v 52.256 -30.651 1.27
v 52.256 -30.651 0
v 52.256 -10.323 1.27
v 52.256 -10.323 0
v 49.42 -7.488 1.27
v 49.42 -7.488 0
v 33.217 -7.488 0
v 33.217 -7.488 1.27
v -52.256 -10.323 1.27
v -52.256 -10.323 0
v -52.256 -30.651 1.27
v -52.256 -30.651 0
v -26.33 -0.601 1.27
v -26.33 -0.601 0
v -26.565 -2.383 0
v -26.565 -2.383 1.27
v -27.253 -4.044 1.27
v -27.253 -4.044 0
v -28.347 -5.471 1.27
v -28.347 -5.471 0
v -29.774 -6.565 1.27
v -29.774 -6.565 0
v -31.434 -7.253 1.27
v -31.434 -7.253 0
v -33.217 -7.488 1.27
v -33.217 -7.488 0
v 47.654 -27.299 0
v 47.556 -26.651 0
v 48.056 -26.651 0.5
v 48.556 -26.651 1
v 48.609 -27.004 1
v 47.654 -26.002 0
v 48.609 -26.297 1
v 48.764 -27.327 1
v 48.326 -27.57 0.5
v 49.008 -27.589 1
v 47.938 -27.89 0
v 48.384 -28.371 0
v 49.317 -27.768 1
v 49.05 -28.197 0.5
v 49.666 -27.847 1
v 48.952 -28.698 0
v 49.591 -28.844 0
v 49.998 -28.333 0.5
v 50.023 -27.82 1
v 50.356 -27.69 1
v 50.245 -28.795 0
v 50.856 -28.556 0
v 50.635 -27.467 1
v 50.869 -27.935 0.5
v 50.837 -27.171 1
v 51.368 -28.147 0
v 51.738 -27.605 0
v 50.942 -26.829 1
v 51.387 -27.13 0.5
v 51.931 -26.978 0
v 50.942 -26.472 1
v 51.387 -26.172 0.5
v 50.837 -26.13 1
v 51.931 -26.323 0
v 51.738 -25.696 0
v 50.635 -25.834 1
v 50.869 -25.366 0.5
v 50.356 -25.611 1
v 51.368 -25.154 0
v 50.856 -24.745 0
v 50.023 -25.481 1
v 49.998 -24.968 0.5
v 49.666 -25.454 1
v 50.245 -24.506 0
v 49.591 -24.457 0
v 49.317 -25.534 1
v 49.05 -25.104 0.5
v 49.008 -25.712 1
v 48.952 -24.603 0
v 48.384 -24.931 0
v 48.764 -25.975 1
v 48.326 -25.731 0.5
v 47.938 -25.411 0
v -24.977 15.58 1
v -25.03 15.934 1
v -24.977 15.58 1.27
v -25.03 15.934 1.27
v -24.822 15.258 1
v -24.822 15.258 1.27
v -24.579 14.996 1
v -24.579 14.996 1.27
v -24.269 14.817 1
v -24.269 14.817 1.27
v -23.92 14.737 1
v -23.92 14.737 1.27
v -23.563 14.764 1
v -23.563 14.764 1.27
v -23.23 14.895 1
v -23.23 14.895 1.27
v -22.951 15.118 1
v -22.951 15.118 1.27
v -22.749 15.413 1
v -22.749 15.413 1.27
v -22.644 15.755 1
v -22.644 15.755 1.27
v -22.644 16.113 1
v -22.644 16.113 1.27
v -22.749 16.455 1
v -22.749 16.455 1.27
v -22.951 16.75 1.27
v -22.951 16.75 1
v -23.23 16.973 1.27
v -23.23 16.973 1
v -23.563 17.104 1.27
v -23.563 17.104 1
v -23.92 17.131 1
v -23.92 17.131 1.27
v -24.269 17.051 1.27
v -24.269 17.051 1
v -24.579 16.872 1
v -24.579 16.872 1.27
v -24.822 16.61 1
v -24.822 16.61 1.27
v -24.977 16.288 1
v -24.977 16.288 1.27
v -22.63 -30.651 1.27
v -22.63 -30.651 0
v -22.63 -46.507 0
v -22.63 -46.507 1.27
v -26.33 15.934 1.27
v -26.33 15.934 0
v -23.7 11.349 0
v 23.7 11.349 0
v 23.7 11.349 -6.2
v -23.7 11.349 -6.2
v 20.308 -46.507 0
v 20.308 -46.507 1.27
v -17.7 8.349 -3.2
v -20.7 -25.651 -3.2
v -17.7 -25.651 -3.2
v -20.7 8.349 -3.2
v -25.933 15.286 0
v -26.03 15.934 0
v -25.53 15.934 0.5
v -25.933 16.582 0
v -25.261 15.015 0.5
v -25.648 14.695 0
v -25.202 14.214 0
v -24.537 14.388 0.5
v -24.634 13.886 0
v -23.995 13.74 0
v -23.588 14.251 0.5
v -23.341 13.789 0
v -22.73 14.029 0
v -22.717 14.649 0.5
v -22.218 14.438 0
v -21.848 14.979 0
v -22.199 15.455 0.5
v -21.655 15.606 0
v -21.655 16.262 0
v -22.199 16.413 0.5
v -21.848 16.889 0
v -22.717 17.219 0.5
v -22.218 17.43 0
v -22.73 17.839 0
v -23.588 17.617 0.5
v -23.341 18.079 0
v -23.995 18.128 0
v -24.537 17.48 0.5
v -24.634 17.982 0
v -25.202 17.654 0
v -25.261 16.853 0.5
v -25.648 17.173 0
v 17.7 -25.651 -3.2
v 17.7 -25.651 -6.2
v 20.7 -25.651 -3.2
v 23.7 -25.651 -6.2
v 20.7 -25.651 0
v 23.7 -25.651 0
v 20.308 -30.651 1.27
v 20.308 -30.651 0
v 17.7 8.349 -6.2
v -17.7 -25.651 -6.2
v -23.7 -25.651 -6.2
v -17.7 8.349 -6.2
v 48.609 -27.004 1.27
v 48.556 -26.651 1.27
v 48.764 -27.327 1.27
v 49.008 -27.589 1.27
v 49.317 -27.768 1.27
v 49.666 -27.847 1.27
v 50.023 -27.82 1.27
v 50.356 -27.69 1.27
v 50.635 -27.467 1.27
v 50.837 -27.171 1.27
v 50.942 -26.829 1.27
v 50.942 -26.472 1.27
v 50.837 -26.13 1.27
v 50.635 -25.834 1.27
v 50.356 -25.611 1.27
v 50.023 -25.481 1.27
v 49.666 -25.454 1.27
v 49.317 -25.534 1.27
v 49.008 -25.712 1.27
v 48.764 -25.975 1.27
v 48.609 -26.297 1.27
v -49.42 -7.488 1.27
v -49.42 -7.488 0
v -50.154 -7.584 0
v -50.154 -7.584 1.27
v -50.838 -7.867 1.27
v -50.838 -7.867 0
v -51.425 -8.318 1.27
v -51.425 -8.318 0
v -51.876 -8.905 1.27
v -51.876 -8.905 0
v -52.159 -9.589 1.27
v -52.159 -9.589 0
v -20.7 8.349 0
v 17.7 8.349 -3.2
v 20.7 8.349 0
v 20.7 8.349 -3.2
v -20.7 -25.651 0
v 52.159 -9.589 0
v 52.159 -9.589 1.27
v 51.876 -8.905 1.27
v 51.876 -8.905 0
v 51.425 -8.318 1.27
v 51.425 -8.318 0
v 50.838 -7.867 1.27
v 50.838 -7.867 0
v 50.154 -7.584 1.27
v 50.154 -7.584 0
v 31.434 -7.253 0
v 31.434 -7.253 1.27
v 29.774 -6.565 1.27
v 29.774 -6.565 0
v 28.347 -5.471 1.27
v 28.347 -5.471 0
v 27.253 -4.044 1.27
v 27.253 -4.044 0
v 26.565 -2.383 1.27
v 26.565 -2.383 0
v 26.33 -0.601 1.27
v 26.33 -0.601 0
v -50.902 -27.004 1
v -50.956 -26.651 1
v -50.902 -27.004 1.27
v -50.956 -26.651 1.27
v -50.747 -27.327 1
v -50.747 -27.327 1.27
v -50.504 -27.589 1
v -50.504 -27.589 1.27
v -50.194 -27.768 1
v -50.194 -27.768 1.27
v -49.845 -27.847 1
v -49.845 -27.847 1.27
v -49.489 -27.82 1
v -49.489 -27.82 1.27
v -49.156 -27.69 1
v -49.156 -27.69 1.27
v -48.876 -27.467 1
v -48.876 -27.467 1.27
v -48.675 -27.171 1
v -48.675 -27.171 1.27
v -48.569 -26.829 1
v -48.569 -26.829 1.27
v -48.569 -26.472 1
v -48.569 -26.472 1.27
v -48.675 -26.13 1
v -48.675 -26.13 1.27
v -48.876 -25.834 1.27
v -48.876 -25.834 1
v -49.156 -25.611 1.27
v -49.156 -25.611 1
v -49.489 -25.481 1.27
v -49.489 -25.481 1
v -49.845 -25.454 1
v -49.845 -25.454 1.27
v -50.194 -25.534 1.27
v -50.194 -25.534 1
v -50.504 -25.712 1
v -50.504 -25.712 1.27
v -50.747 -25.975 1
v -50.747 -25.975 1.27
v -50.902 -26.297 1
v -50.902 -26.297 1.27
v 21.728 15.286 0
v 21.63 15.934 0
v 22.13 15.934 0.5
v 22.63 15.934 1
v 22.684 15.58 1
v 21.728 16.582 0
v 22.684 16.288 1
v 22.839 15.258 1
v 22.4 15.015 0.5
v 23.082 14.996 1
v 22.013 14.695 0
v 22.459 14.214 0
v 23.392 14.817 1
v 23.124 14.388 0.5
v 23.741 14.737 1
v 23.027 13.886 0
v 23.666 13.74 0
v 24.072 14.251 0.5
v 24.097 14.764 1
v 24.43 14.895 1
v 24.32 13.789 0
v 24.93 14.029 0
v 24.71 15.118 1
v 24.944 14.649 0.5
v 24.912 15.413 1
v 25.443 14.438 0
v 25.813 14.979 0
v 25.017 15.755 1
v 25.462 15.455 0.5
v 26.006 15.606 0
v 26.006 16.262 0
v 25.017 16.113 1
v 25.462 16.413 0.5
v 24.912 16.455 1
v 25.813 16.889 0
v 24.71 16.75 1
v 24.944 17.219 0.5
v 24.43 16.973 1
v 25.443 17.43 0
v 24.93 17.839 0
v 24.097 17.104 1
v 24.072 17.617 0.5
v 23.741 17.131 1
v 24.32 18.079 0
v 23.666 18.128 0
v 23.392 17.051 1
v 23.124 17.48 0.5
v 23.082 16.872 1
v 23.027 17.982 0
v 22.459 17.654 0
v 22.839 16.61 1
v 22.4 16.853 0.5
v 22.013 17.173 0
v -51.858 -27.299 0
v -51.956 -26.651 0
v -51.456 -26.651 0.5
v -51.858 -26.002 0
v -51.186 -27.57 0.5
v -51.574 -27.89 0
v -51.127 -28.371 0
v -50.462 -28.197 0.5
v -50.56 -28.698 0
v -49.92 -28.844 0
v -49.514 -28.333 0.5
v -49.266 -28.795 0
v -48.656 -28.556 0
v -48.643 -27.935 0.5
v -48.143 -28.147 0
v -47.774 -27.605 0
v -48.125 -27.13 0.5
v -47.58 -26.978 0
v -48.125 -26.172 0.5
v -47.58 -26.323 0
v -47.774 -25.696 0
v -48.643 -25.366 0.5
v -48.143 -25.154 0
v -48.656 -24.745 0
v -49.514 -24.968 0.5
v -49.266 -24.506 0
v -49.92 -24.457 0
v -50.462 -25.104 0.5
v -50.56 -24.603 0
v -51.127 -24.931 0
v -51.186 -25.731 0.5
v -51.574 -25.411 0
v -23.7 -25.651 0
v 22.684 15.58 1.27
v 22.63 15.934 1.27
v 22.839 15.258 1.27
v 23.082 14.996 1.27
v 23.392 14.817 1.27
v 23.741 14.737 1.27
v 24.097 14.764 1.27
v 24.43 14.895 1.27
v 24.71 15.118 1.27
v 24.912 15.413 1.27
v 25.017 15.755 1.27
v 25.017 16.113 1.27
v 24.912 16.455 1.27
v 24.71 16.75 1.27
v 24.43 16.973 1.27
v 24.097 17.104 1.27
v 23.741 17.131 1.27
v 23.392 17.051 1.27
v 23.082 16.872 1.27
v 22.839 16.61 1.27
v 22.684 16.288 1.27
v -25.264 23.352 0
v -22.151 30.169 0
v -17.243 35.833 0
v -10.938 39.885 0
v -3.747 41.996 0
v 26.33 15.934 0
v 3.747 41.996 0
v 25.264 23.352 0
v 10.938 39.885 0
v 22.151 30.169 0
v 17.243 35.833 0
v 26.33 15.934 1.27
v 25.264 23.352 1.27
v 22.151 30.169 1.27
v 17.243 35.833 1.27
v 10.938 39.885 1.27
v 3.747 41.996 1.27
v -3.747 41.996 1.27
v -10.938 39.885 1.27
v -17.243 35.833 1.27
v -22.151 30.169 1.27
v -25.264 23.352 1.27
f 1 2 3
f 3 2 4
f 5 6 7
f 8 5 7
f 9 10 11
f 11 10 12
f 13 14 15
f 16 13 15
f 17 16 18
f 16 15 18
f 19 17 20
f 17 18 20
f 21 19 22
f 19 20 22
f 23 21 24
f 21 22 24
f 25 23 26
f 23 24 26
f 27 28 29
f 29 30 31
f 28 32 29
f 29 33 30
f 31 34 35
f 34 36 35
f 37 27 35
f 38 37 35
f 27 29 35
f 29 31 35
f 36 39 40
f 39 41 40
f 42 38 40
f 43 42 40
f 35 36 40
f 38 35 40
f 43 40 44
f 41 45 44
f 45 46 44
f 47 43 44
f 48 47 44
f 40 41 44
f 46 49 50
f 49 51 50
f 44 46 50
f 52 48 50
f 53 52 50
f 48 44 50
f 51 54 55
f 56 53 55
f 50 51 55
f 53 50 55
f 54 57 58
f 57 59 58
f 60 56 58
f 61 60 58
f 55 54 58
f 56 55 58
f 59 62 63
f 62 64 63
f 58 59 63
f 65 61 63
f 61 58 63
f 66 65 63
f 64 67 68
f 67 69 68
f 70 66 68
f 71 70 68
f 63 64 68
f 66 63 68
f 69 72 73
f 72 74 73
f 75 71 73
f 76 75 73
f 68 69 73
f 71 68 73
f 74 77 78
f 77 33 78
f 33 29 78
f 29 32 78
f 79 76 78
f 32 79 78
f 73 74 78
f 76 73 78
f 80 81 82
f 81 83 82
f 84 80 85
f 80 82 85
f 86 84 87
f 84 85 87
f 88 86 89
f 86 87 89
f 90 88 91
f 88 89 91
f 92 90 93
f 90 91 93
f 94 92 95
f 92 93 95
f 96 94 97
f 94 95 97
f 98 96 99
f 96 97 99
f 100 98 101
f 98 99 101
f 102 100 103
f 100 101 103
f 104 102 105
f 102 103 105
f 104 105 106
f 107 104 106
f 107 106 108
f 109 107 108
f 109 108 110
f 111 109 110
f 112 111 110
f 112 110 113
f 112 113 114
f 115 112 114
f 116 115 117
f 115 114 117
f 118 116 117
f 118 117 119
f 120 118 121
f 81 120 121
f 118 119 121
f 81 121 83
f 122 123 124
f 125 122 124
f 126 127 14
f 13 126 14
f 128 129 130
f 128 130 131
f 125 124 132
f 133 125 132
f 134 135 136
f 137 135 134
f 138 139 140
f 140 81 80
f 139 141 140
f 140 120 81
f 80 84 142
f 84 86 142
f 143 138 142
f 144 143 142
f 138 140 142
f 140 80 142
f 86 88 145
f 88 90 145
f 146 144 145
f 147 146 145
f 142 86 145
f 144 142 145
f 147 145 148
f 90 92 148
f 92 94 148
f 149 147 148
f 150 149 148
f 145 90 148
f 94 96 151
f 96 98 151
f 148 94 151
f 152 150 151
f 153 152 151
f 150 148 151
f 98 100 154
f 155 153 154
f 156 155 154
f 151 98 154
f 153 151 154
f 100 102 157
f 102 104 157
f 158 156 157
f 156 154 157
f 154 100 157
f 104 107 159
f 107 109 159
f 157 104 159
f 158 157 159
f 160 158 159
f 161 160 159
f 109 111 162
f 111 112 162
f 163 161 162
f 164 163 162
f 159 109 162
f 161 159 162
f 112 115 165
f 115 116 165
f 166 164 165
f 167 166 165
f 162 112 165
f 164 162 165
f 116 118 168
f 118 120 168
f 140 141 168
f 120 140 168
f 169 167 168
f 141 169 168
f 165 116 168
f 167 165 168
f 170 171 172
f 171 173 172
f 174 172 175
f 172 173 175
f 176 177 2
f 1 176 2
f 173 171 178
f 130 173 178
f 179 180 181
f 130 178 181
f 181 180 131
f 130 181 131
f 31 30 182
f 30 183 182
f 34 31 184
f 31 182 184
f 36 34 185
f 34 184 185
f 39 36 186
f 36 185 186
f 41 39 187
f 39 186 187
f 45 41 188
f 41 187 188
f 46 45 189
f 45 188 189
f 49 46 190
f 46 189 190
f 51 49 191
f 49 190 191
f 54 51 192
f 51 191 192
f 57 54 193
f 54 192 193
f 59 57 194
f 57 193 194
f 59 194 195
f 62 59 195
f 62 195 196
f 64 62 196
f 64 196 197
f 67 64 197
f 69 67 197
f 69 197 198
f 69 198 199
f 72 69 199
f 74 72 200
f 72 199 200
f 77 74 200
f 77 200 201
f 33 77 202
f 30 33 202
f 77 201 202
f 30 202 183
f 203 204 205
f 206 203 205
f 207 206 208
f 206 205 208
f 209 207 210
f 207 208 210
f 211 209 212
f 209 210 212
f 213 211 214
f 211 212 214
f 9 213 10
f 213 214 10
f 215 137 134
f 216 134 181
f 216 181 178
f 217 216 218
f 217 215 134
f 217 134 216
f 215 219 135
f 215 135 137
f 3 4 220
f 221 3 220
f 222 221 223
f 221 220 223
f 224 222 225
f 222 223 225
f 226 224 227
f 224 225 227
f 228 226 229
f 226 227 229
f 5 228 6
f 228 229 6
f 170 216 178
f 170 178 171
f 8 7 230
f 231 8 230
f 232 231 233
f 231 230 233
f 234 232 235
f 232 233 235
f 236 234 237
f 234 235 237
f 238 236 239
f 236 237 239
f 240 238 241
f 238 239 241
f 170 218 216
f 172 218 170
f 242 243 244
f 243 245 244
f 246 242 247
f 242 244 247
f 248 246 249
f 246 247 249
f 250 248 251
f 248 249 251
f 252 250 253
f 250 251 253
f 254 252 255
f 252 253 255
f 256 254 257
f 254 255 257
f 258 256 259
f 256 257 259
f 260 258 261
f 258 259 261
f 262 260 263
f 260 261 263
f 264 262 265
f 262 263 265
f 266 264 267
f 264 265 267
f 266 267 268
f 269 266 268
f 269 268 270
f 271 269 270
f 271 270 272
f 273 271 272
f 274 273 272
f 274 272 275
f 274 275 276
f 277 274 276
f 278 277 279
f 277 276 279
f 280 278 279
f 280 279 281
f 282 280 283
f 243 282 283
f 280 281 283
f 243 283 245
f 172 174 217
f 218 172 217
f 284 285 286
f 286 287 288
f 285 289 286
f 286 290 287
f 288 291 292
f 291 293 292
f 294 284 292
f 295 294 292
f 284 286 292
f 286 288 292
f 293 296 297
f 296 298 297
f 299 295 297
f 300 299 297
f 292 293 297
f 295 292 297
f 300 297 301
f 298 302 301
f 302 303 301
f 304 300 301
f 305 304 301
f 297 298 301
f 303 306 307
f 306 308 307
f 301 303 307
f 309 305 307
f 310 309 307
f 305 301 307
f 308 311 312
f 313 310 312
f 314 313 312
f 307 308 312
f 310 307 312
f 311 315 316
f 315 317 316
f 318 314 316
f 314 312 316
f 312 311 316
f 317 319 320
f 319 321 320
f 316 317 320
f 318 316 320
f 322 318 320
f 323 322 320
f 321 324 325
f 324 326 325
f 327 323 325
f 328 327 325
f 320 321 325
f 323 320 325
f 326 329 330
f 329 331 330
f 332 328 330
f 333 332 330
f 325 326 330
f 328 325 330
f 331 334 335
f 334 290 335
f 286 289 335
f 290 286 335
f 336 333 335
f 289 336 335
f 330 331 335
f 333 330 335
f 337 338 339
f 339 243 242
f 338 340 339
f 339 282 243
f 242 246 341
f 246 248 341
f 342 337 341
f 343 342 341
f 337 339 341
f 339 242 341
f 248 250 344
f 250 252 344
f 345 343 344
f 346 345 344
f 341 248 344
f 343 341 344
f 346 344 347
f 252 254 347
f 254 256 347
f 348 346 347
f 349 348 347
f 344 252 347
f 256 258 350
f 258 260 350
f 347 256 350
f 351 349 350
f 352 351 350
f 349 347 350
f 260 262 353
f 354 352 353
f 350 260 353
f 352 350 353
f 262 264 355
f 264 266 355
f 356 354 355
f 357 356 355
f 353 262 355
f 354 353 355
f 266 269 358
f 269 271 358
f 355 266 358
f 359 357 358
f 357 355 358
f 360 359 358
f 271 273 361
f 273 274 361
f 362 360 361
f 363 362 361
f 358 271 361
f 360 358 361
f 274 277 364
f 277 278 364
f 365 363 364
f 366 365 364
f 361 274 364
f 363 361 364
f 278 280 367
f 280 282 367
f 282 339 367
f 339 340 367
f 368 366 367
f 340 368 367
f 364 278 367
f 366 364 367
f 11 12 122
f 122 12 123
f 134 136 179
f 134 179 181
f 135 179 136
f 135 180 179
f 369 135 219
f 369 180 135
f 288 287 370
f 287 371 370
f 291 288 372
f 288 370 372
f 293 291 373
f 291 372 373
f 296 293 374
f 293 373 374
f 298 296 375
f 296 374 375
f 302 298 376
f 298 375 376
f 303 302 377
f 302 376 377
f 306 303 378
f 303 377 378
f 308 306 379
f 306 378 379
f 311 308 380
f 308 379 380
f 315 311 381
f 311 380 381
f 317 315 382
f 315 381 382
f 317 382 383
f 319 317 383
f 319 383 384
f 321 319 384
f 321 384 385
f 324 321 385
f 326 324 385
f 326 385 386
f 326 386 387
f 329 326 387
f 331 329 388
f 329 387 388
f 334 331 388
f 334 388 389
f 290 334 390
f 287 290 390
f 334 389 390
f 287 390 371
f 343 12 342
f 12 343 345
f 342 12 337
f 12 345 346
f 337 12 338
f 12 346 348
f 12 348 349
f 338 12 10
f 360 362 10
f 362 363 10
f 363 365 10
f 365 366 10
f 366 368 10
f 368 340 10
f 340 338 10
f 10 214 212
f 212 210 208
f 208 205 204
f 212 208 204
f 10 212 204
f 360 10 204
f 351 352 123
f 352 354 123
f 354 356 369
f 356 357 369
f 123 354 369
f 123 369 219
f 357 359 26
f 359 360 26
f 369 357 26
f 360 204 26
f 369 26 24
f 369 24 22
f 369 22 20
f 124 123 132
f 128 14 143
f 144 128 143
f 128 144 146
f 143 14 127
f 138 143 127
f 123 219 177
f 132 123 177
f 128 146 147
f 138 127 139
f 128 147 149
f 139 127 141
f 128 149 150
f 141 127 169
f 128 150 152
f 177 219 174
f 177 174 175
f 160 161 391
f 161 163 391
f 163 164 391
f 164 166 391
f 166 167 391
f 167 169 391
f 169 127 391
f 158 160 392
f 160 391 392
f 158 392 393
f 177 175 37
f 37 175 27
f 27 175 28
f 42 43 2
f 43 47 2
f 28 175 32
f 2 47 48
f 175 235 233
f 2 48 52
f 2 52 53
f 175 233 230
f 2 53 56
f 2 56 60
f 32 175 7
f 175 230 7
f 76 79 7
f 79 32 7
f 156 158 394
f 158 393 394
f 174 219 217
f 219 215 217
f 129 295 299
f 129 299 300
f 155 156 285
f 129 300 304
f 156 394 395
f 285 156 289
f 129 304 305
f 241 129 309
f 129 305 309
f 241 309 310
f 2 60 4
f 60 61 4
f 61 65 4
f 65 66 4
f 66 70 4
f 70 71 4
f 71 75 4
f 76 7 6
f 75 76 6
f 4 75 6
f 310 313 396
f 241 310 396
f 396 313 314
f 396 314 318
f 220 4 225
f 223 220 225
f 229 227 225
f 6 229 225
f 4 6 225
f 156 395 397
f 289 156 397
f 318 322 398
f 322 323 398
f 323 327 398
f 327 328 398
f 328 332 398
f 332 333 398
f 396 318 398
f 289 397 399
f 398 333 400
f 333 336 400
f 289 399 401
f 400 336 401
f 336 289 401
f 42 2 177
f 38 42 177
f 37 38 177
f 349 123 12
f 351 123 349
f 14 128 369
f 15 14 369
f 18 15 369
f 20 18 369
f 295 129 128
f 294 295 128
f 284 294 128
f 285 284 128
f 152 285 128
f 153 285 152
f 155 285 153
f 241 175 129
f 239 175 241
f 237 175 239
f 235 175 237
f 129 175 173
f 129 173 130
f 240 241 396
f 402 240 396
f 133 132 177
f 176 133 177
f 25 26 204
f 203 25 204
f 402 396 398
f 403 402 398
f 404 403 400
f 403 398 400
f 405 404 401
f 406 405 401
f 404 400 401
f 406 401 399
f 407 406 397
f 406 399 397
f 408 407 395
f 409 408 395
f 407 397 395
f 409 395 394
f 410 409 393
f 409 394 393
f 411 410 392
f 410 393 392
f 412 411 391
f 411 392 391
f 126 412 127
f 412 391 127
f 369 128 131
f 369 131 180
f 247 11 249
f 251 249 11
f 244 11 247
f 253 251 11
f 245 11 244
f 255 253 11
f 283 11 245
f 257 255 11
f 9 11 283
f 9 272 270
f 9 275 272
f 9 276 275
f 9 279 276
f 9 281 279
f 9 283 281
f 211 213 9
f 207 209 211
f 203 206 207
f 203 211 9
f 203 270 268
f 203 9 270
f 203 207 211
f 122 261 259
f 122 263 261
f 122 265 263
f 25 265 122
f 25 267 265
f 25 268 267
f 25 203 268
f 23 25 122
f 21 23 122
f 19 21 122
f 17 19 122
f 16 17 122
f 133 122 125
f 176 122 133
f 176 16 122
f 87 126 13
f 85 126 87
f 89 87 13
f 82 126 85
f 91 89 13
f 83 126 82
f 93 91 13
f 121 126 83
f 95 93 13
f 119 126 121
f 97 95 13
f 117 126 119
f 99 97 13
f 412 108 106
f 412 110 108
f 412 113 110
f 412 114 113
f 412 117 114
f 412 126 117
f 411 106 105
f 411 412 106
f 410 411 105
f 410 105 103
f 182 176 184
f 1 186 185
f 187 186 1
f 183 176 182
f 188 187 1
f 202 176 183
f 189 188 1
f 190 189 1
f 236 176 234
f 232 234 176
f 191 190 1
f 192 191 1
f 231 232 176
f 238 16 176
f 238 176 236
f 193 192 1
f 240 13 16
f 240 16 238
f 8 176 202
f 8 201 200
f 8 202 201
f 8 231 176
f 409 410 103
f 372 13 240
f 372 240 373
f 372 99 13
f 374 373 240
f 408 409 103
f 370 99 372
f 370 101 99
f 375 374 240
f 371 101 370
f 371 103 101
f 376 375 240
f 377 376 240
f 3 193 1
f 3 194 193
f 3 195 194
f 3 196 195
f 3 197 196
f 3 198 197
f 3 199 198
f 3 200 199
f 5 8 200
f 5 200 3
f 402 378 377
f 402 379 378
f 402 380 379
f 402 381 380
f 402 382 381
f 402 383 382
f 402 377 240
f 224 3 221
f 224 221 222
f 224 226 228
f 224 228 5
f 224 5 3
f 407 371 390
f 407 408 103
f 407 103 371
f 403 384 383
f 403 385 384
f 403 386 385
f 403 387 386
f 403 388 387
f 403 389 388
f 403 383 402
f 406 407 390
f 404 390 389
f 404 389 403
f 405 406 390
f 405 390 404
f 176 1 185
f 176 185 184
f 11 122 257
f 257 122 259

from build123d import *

# Parameters (mm, degrees)
F0_R           = 2.2
F0_W           = 3
F0_H           = 34
F0_R_2         = 1.2
F1_DEPTH       = 1.27
F2_D           = 2.4
F2_CSINK_D     = 4.4
F2_CSINK_ANGLE = 90
F3_DEPTH       = 6.2
F5_W           = 34
F5_H           = 3
F6_DEPTH       = 3
F4_W           = 34
F4_H           = 3
F7_DEPTH       = 3


with BuildPart() as f1:
    # F0 (on Top) → F1 (new body)
    with BuildSketch(Plane.XY):
        with BuildLine():
            Line((-22.6304123436, -30.6505662125), (-22.6304123436, -46.5069715967))
            Line((-22.6304123436, -46.5069715967), (20.3084139398, -46.5069715967))
            Line((20.3084139398, -46.5069715967), (20.3084139398, -30.6505662125))
            Line((20.3084139398, -30.6505662125), (52.2557814969, -30.6505662125))
            Line((52.2557814969, -30.6505662125), (52.2557814969, -10.3231005183))
            ThreePointArc((52.2557814969, -10.3231005183), (51.4252585036, -8.3180406439), (49.4201986292, -7.4875176505))
            Line((49.4201986292, -7.4875176505), (33.2168278796, -7.4875176505))
            ThreePointArc((33.2168278796, -7.4875176505), (28.347396756, -5.4705332381), (26.3304123436, -0.6011021145))
            Line((26.3304123436, -0.6011021145), (26.3304123436, 15.9340094723))
            ThreePointArc((26.3304123436, 15.9340094723), (0, 42.2644218159), (-26.3304123436, 15.9340094723))
            Line((-26.3304123436, 15.9340094723), (-26.3304123436, -0.6011021145))
            ThreePointArc((-26.3304123436, -0.6011021145), (-28.347396756, -5.4705332381), (-33.2168278796, -7.4875176505))
            Line((-33.2168278796, -7.4875176505), (-49.4201986292, -7.4875176505))
            ThreePointArc((-49.4201986292, -7.4875176505), (-51.4252585036, -8.3180406439), (-52.2557814969, -10.3231005183))
            Line((-52.2557814969, -10.3231005183), (-52.2557814969, -30.6505662125))
            Line((-52.2557814969, -30.6505662125), (-22.6304123436, -30.6505662125))
        make_face()
        with Locations((-49.7557814969, -26.6505662125)):
            Circle(F0_R, mode=Mode.SUBTRACT)
        with Locations((49.7557814969, -26.6505662125)):
            Circle(F0_R, mode=Mode.SUBTRACT)
        Polygon((20.7, 8.3494337875), (-20.7, 8.3494337875), (-20.7, -25.6505662125), (-23.7, -25.6505662125), (-23.7, 8.3494337875), (-23.7, 11.3494337875), (23.7, 11.3494337875), (23.7, 8.3494337875), (23.7, -25.6505662125), (20.7, -25.6505662125), align=None, mode=Mode.SUBTRACT)
        with Locations((-23.8304123436, 15.9340094723)):
            Circle(F0_R, mode=Mode.SUBTRACT)
        with Locations((23.8304123436, 15.9340094723)):
            Circle(F0_R, mode=Mode.SUBTRACT)
        Polygon((-23.7, 8.3494337875), (-20.7, 8.3494337875), (20.7, 8.3494337875), (23.7, 8.3494337875), (23.7, 11.3494337875), (-23.7, 11.3494337875), align=None)
        with Locations((-22.2, -8.6505662125)):
            Rectangle(F0_W, F0_H)
        with Locations((22.2, -8.6505662125)):
            Rectangle(F0_W, F0_H)
        with Locations((-23.8304123436, 15.9340094723)):
            Circle(F0_R)
        with Locations((-23.8304123436, 15.9340094723)):
            Circle(F0_R_2, mode=Mode.SUBTRACT)
        with Locations((23.8304123436, 15.9340094723)):
            Circle(F0_R)
        with Locations((23.8304123436, 15.9340094723)):
            Circle(F0_R_2, mode=Mode.SUBTRACT)
        with Locations((49.7557814969, -26.6505662125)):
            Circle(F0_R)
        with Locations((49.7557814969, -26.6505662125)):
            Circle(F0_R_2, mode=Mode.SUBTRACT)
        with Locations((-49.7557814969, -26.6505662125)):
            Circle(F0_R)
        with Locations((-49.7557814969, -26.6505662125)):
            Circle(F0_R_2, mode=Mode.SUBTRACT)
        with Locations((-49.7557814969, -26.6505662125)):
            Circle(F0_R_2)
        with Locations((-23.8304123436, 15.9340094723)):
            Circle(F0_R_2)
        with Locations((23.8304123436, 15.9340094723)):
            Circle(F0_R_2)
        with Locations((49.7557814969, -26.6505662125)):
            Circle(F0_R_2)
    extrude(amount=F1_DEPTH)

    # F2 (through all)
    with Locations(Plane(origin=(0, 0, 0), x_dir=(1, 0, 0), z_dir=(0, 0, -1))):
        with Locations((-49.7557814969, 26.6505662125), (49.7557814969, 26.6505662125), (-23.8304123436, -15.9340094723), (23.8304123436, -15.9340094723)):
            CounterSinkHole(F2_D / 2, F2_CSINK_D / 2, counter_sink_angle=F2_CSINK_ANGLE)

    # F0 (on Top) → F3 (join)
    with BuildSketch(Plane.XY):
        with Locations((-22.2, -8.6505662125)):
            Rectangle(F0_W, F0_H)
        Polygon((-23.7, 8.3494337875), (-20.7, 8.3494337875), (20.7, 8.3494337875), (23.7, 8.3494337875), (23.7, 11.3494337875), (-23.7, 11.3494337875), align=None)
        with Locations((22.2, -8.6505662125)):
            Rectangle(F0_W, F0_H)
    extrude(amount=-F3_DEPTH)

    # F5 (on face) → F6 (join)
    with BuildSketch(Plane(origin=(20.7, 0, 0), x_dir=(0, -1, 0), z_dir=(-1, 0, 0))):
        with Locations((8.6505662125, -4.7)):
            Rectangle(F5_W, F5_H)
    extrude(amount=F6_DEPTH)

    # F4 (on face) → F7 (join)
    with BuildSketch(Plane.YZ.offset(-20.7)):
        with Locations((-8.6505662125, -4.7)):
            Rectangle(F4_W, F4_H)
    extrude(amount=F7_DEPTH)


solid = f1.part
